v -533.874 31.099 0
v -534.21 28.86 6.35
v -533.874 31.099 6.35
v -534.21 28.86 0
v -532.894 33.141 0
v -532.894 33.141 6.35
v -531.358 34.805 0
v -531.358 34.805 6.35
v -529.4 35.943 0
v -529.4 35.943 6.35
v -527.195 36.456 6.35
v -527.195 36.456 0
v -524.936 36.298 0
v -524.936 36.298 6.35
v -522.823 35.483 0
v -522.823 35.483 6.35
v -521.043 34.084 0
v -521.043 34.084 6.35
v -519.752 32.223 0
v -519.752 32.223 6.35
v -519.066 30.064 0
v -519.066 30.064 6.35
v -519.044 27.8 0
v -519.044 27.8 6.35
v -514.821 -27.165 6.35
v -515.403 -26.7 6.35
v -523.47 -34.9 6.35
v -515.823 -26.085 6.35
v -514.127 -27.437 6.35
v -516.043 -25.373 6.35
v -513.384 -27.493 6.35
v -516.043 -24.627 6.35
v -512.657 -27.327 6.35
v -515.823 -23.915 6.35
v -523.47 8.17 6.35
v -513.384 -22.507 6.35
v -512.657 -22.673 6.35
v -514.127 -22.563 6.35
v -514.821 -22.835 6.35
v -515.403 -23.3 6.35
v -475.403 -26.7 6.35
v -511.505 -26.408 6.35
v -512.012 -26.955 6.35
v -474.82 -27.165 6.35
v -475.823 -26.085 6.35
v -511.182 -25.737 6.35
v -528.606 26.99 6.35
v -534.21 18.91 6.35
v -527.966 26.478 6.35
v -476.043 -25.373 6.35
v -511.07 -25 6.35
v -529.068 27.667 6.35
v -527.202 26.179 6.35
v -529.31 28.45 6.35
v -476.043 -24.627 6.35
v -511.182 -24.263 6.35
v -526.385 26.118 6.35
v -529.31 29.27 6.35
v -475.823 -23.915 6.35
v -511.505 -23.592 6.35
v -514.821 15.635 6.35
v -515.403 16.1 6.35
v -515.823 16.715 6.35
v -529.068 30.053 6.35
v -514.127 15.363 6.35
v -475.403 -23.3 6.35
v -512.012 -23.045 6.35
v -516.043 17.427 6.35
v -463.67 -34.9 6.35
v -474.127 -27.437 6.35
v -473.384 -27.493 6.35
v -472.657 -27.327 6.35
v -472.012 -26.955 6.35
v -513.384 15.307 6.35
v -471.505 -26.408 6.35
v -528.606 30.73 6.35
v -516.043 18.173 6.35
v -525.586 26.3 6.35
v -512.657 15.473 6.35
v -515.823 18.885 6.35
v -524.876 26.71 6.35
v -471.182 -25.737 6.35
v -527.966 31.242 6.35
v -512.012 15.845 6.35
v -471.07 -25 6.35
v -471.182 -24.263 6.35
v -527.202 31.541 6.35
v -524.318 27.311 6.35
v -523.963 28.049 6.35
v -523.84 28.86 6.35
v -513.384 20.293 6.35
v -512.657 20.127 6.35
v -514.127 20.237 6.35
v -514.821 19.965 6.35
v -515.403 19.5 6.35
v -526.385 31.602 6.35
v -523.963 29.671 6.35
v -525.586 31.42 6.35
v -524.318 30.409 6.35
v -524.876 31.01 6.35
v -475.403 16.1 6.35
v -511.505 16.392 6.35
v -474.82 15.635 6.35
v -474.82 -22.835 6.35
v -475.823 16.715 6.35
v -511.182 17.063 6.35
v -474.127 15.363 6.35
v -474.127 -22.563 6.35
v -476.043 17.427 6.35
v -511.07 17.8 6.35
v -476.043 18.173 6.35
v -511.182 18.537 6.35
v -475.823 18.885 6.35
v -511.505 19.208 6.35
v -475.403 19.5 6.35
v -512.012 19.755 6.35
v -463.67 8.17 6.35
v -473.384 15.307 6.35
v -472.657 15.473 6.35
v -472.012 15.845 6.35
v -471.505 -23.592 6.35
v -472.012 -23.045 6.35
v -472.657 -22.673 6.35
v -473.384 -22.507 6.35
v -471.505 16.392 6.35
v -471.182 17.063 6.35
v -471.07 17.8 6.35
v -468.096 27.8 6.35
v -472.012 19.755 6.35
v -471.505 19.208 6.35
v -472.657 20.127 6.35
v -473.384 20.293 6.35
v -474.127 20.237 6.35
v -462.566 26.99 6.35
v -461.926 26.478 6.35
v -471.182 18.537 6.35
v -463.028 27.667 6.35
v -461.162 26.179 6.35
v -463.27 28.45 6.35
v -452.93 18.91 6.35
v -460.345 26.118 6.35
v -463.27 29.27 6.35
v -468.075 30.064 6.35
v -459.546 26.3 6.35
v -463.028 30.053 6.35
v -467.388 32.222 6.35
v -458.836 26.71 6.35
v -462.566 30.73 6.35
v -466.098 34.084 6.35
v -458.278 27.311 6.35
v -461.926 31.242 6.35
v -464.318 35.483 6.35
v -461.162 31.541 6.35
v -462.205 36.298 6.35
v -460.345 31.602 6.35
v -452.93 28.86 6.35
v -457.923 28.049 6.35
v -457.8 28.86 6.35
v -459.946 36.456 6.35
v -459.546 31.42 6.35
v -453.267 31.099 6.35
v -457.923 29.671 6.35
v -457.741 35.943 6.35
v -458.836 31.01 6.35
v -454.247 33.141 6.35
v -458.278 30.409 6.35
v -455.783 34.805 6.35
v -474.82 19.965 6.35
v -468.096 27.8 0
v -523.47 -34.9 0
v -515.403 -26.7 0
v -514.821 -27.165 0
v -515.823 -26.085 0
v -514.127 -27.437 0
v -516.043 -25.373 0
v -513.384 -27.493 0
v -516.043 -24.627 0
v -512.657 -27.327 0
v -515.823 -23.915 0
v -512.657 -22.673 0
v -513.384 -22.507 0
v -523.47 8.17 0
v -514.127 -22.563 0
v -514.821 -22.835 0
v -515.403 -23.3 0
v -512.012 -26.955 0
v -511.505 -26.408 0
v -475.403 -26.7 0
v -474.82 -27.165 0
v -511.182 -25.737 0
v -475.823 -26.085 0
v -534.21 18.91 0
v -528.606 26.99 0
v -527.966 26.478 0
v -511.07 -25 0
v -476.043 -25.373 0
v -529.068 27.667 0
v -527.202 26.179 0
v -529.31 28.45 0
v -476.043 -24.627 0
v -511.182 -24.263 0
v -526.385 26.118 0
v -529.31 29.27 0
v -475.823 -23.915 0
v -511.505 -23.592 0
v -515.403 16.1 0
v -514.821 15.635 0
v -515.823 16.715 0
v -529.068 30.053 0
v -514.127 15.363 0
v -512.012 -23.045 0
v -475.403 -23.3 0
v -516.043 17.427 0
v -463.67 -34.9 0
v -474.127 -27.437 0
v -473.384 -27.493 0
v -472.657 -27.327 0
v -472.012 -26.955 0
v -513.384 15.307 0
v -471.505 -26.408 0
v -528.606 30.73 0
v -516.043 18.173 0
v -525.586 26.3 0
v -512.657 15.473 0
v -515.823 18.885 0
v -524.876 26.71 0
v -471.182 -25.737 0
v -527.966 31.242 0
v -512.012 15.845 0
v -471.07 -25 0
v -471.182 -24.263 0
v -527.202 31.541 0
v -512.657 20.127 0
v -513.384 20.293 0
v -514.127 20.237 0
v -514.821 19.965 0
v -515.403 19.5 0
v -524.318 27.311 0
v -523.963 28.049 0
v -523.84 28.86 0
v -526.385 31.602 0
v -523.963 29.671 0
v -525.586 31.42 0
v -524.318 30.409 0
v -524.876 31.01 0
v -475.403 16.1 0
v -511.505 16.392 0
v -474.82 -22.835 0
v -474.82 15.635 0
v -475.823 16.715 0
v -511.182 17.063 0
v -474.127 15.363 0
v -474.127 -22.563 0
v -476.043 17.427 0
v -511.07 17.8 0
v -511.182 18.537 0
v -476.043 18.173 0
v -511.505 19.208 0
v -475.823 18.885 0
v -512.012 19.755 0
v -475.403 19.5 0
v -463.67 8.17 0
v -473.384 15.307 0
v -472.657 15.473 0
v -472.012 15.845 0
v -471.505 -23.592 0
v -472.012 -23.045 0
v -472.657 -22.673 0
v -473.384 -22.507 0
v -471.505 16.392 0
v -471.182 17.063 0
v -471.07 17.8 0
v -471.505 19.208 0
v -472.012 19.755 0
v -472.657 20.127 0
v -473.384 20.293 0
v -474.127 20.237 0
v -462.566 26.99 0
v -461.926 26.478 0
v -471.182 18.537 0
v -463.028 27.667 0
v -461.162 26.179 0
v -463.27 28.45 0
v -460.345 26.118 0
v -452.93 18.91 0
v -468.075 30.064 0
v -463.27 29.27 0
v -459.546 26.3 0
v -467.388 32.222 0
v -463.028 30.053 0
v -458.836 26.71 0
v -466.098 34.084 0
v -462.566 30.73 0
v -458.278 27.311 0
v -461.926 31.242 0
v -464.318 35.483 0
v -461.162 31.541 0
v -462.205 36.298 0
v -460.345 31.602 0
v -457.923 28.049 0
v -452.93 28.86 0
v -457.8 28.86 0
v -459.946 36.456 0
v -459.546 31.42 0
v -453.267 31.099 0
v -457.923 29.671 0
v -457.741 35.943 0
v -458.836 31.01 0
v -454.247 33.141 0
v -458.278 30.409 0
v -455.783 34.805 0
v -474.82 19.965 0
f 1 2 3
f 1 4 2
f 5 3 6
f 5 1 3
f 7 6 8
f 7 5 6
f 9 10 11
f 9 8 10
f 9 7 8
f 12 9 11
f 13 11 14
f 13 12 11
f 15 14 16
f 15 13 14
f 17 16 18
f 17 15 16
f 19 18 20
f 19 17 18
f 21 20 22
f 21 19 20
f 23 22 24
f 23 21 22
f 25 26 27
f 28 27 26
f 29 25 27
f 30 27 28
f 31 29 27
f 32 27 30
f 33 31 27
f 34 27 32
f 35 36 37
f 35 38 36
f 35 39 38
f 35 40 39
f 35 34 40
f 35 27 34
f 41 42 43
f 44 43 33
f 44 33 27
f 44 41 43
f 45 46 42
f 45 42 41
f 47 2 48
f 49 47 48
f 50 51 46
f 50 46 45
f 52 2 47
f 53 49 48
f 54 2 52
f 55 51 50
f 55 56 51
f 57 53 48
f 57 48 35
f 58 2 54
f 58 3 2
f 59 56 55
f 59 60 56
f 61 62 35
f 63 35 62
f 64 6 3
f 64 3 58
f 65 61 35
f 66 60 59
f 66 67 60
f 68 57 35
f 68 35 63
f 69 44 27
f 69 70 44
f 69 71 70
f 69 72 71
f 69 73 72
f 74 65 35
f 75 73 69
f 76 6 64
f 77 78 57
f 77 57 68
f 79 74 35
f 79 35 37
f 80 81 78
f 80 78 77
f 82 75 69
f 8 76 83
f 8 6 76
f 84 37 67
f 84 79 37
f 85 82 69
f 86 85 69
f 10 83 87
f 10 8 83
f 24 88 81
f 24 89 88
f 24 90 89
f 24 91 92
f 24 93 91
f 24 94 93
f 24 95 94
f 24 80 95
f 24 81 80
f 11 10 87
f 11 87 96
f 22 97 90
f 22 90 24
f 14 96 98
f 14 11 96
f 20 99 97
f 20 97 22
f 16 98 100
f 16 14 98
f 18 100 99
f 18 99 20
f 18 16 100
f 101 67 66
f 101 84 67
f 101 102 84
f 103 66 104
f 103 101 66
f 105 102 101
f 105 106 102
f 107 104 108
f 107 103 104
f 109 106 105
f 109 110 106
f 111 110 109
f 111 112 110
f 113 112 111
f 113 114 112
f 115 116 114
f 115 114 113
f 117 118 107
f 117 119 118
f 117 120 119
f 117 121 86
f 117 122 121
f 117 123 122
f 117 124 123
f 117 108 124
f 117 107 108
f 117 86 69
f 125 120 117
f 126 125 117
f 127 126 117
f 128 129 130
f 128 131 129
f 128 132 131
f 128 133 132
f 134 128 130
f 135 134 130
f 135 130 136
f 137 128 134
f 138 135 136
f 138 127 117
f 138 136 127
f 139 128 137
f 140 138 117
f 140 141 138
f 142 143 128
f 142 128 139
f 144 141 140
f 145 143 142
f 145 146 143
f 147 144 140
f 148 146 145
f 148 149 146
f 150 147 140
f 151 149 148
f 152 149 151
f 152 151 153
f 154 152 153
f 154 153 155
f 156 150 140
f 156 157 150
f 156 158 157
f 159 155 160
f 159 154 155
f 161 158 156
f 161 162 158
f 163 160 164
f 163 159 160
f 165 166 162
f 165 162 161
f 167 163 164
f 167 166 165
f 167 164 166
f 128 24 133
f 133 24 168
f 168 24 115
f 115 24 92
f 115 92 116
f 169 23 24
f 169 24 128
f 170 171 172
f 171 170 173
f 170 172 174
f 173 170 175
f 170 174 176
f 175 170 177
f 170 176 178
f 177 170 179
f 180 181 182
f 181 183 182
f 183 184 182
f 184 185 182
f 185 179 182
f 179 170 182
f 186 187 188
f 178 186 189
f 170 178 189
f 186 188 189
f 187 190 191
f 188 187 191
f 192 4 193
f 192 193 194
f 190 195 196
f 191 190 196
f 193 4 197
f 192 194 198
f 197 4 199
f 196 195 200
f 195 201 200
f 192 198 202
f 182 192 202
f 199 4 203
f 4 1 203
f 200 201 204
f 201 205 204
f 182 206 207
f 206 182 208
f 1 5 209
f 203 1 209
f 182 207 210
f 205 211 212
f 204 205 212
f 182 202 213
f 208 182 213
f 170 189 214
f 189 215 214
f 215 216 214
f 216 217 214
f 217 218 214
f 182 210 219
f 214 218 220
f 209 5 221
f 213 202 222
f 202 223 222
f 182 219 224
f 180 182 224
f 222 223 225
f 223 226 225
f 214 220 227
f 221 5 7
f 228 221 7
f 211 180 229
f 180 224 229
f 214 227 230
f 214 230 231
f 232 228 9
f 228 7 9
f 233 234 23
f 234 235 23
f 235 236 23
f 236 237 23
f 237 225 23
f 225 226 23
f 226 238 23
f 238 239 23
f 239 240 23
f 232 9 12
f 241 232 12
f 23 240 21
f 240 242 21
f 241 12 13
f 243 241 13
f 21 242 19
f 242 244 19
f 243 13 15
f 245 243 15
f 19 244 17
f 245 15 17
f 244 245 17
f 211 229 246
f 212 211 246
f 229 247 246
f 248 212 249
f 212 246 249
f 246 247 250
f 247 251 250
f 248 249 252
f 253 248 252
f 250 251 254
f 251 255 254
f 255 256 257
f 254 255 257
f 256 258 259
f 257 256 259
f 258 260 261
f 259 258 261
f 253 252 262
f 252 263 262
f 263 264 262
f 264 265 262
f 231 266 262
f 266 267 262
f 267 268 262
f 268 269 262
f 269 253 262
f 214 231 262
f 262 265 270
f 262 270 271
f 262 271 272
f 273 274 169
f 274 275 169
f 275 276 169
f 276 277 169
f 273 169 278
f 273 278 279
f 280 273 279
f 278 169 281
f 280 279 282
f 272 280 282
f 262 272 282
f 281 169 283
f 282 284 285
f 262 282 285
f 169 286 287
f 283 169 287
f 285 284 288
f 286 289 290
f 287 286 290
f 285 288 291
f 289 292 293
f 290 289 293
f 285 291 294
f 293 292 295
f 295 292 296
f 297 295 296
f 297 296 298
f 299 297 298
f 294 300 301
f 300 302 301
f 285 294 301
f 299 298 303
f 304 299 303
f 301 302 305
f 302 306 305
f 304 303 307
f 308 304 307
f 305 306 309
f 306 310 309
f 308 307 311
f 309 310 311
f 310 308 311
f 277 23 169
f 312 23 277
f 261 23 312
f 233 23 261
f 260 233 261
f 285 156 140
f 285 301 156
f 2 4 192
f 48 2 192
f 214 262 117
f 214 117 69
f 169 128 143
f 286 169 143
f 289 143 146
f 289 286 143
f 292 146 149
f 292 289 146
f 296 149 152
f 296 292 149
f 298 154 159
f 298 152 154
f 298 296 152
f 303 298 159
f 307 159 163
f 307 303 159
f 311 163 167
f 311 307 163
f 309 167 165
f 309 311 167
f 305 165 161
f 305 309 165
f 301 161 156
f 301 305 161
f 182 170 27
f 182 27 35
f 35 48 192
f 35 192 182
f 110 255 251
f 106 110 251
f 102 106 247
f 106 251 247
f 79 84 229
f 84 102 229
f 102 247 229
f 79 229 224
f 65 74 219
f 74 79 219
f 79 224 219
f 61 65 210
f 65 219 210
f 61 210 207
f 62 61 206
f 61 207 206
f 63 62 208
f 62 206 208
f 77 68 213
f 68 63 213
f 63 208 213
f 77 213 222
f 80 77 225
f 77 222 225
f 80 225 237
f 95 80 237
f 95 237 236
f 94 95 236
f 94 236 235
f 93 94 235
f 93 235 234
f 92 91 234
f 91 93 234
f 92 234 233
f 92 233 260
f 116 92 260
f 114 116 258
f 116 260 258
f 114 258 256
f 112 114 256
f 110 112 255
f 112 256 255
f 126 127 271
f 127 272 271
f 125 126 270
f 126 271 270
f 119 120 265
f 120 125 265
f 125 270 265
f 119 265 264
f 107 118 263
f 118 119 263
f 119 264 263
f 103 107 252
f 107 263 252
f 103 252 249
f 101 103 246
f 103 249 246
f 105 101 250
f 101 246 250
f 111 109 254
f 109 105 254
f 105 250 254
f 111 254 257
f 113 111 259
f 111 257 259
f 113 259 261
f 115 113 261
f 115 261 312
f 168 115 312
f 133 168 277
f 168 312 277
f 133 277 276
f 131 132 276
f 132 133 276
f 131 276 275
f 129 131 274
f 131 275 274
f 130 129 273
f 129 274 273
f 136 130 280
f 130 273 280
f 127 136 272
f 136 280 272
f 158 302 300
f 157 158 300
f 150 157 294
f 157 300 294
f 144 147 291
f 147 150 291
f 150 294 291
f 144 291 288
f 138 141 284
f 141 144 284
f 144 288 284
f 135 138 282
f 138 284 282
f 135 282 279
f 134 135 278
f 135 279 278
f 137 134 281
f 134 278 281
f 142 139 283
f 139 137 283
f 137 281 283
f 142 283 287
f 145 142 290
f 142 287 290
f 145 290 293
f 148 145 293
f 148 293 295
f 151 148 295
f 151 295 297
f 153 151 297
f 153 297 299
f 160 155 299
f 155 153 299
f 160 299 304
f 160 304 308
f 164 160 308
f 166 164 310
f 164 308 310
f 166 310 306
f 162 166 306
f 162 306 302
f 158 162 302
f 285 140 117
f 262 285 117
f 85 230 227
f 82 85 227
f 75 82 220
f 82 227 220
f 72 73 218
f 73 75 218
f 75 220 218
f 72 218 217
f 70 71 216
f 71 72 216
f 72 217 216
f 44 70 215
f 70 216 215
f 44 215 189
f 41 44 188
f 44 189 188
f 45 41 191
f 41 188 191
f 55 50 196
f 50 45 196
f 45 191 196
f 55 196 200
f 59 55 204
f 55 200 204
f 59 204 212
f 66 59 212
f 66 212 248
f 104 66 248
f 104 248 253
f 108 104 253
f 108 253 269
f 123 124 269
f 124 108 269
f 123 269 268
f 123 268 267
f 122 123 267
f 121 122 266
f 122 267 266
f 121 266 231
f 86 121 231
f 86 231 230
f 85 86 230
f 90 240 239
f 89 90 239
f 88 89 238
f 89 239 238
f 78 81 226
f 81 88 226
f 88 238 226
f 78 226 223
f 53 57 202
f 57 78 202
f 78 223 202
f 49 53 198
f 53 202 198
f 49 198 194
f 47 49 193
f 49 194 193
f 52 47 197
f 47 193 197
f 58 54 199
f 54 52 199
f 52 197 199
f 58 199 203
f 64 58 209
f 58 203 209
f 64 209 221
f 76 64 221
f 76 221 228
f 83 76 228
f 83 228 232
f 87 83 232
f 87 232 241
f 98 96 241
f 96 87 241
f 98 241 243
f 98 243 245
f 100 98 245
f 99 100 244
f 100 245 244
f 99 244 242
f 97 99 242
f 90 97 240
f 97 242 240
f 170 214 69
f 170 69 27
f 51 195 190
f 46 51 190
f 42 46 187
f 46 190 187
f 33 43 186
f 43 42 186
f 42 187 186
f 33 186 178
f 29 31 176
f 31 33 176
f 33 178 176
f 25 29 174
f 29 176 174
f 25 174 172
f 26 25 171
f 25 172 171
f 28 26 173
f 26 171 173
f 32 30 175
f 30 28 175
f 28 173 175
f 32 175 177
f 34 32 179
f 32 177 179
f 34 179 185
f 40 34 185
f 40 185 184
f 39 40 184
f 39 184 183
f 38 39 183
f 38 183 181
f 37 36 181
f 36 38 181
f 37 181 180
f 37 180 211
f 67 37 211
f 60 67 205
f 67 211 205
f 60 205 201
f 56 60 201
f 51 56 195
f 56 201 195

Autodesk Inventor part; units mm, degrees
ref_plane "YZ Plane" through (0, 0, 0) normal (1, 0, 0) x (0, 1, 0)
ref_plane "XZ Plane" through (0, 0, 0) normal (0, 1, 0) x (-1, 0, 0)
ref_plane "XY Plane" through (0, 0, 0) normal (0, 0, 1) x (1, 0, 0)
ref_plane "Work Plane1" through (0, 0, 0) normal (0, 0, 1) x (1, 0, 0)
sketch "Sketch1" plane through (0, 0, 0) normal (0, 0, 1) x (1, 0, 0)
  circle A0 centre (-473.5705, 17.8) radius 2.5 projected
  circle A1 centre (-473.5705, 17.8) radius 9.9 construction
  circle A2 centre (-473.5705, -25) radius 2.5 projected
  circle A3 centre (-473.5705, -25) radius 9.9 construction
  line L0 (-473.5705, -25) -> (-473.5705, 17.8) construction
  circle A4 centre (-513.5705, 17.8) radius 2.5 projected
  circle A5 centre (-513.5705, 17.8) radius 9.9 construction
  circle A6 centre (-513.5705, -25) radius 2.5 projected
  circle A7 centre (-513.5705, -25) radius 9.9 construction
  line L1 (-513.5705, 17.8) -> (-513.5705, -25) construction
  line L2 (-513.5705, 17.8) -> (-473.5705, 17.8) construction
  line L3 (-513.5705, -25) -> (-473.5705, -25) construction
  line L4 (-463.6705, 18.91) -> (-463.6705, -34.9)
  line L5 (-463.6705, -34.9) -> (-523.4705, -34.9)
  line L6 (-523.4705, -34.9) -> (-523.4705, 18.91)
  line L7 (-519.0445, 27.8) -> (-468.0964, 27.8)
  line L8 (-463.6705, 27.8) -> (-453.6705, 27.8) construction
  line L9 (-452.9305, 18.91) -> (-463.6705, 18.91)
  line L10 (-534.2105, 28.86) -> (-534.2105, 18.91)
  line L11 (-534.2105, 18.91) -> (-523.4705, 18.91)
  circle A8 centre (-460.5505, 28.86) radius 2.75
  line L12 (-473.5705, -3.6) -> (-408.7211, -3.6) construction
  line L13 (-564.232, 28.86) -> (-376.8573, 28.86) construction
  arc A9 (-452.9305, 28.86) -> (-468.0964, 27.8) centre (-460.5505, 28.86) ccw
  line L14 (-493.5705, 27.8) -> (-493.5705, -34.9) construction
  line L15 (-452.9305, 28.86) -> (-452.9305, 18.91)
  circle A10 centre (-526.5905, 28.86) radius 2.75
  arc A11 (-519.0445, 27.8) -> (-534.2105, 28.86) centre (-526.5905, 28.86) ccw
  point P0 (0, 0)
  point P1 (-514.2552, 27.8)
  point P2 (-534.2105, 10.8915)
  dimension "d2" = 10
  dimension "d14" = 0
  dimension "d16" = 32.46
  dimension "d17" = 33.02
  dimension "d18" = 5.5
  dimension "d19" = 7.62
  dimension "d20" = 8.89
extrude "Extrusion1" add sketch "Sketch1" along normal blind 6.35
sketch "Sketch2" plane through (0, 0, 6.35) normal (0, 0, 1) x (1, 0, 0)
  line L0 (-463.6705, 18.91) -> (-452.9305, 18.91) projected
  line L1 (-452.9305, 18.91) -> (-463.6705, 8.17)
  line L2 (-534.2105, 28.86) -> (-534.2105, 18.91) projected
  line L3 (-534.2105, 18.91) -> (-523.4705, 8.17)
  line L4 (-523.4705, 18.91) -> (-523.4705, -34.9) projected
  line L5 (-534.2105, 18.91) -> (-523.4705, 18.91) projected
  line L6 (-534.2105, 18.91) -> (-523.4705, 18.91)
  line L7 (-523.4705, 8.17) -> (-523.4705, 18.91)
  line L8 (-463.6705, -34.9) -> (-463.6705, 18.91) projected
  line L9 (-463.6705, 8.17) -> (-463.6705, 18.91)
  line L10 (-452.9305, 18.91) -> (-463.6705, 18.91)
  point P0 (0, 0)
  point P1 (-548.4705, 27.8)
  point P2 (-548.4705, 15.264)
  dimension "d6" = 45
extrude "Extrusion2" add sketch "Sketch2" against normal up to surface (6.35 mm away)
properties part number "CarriagePlate"
